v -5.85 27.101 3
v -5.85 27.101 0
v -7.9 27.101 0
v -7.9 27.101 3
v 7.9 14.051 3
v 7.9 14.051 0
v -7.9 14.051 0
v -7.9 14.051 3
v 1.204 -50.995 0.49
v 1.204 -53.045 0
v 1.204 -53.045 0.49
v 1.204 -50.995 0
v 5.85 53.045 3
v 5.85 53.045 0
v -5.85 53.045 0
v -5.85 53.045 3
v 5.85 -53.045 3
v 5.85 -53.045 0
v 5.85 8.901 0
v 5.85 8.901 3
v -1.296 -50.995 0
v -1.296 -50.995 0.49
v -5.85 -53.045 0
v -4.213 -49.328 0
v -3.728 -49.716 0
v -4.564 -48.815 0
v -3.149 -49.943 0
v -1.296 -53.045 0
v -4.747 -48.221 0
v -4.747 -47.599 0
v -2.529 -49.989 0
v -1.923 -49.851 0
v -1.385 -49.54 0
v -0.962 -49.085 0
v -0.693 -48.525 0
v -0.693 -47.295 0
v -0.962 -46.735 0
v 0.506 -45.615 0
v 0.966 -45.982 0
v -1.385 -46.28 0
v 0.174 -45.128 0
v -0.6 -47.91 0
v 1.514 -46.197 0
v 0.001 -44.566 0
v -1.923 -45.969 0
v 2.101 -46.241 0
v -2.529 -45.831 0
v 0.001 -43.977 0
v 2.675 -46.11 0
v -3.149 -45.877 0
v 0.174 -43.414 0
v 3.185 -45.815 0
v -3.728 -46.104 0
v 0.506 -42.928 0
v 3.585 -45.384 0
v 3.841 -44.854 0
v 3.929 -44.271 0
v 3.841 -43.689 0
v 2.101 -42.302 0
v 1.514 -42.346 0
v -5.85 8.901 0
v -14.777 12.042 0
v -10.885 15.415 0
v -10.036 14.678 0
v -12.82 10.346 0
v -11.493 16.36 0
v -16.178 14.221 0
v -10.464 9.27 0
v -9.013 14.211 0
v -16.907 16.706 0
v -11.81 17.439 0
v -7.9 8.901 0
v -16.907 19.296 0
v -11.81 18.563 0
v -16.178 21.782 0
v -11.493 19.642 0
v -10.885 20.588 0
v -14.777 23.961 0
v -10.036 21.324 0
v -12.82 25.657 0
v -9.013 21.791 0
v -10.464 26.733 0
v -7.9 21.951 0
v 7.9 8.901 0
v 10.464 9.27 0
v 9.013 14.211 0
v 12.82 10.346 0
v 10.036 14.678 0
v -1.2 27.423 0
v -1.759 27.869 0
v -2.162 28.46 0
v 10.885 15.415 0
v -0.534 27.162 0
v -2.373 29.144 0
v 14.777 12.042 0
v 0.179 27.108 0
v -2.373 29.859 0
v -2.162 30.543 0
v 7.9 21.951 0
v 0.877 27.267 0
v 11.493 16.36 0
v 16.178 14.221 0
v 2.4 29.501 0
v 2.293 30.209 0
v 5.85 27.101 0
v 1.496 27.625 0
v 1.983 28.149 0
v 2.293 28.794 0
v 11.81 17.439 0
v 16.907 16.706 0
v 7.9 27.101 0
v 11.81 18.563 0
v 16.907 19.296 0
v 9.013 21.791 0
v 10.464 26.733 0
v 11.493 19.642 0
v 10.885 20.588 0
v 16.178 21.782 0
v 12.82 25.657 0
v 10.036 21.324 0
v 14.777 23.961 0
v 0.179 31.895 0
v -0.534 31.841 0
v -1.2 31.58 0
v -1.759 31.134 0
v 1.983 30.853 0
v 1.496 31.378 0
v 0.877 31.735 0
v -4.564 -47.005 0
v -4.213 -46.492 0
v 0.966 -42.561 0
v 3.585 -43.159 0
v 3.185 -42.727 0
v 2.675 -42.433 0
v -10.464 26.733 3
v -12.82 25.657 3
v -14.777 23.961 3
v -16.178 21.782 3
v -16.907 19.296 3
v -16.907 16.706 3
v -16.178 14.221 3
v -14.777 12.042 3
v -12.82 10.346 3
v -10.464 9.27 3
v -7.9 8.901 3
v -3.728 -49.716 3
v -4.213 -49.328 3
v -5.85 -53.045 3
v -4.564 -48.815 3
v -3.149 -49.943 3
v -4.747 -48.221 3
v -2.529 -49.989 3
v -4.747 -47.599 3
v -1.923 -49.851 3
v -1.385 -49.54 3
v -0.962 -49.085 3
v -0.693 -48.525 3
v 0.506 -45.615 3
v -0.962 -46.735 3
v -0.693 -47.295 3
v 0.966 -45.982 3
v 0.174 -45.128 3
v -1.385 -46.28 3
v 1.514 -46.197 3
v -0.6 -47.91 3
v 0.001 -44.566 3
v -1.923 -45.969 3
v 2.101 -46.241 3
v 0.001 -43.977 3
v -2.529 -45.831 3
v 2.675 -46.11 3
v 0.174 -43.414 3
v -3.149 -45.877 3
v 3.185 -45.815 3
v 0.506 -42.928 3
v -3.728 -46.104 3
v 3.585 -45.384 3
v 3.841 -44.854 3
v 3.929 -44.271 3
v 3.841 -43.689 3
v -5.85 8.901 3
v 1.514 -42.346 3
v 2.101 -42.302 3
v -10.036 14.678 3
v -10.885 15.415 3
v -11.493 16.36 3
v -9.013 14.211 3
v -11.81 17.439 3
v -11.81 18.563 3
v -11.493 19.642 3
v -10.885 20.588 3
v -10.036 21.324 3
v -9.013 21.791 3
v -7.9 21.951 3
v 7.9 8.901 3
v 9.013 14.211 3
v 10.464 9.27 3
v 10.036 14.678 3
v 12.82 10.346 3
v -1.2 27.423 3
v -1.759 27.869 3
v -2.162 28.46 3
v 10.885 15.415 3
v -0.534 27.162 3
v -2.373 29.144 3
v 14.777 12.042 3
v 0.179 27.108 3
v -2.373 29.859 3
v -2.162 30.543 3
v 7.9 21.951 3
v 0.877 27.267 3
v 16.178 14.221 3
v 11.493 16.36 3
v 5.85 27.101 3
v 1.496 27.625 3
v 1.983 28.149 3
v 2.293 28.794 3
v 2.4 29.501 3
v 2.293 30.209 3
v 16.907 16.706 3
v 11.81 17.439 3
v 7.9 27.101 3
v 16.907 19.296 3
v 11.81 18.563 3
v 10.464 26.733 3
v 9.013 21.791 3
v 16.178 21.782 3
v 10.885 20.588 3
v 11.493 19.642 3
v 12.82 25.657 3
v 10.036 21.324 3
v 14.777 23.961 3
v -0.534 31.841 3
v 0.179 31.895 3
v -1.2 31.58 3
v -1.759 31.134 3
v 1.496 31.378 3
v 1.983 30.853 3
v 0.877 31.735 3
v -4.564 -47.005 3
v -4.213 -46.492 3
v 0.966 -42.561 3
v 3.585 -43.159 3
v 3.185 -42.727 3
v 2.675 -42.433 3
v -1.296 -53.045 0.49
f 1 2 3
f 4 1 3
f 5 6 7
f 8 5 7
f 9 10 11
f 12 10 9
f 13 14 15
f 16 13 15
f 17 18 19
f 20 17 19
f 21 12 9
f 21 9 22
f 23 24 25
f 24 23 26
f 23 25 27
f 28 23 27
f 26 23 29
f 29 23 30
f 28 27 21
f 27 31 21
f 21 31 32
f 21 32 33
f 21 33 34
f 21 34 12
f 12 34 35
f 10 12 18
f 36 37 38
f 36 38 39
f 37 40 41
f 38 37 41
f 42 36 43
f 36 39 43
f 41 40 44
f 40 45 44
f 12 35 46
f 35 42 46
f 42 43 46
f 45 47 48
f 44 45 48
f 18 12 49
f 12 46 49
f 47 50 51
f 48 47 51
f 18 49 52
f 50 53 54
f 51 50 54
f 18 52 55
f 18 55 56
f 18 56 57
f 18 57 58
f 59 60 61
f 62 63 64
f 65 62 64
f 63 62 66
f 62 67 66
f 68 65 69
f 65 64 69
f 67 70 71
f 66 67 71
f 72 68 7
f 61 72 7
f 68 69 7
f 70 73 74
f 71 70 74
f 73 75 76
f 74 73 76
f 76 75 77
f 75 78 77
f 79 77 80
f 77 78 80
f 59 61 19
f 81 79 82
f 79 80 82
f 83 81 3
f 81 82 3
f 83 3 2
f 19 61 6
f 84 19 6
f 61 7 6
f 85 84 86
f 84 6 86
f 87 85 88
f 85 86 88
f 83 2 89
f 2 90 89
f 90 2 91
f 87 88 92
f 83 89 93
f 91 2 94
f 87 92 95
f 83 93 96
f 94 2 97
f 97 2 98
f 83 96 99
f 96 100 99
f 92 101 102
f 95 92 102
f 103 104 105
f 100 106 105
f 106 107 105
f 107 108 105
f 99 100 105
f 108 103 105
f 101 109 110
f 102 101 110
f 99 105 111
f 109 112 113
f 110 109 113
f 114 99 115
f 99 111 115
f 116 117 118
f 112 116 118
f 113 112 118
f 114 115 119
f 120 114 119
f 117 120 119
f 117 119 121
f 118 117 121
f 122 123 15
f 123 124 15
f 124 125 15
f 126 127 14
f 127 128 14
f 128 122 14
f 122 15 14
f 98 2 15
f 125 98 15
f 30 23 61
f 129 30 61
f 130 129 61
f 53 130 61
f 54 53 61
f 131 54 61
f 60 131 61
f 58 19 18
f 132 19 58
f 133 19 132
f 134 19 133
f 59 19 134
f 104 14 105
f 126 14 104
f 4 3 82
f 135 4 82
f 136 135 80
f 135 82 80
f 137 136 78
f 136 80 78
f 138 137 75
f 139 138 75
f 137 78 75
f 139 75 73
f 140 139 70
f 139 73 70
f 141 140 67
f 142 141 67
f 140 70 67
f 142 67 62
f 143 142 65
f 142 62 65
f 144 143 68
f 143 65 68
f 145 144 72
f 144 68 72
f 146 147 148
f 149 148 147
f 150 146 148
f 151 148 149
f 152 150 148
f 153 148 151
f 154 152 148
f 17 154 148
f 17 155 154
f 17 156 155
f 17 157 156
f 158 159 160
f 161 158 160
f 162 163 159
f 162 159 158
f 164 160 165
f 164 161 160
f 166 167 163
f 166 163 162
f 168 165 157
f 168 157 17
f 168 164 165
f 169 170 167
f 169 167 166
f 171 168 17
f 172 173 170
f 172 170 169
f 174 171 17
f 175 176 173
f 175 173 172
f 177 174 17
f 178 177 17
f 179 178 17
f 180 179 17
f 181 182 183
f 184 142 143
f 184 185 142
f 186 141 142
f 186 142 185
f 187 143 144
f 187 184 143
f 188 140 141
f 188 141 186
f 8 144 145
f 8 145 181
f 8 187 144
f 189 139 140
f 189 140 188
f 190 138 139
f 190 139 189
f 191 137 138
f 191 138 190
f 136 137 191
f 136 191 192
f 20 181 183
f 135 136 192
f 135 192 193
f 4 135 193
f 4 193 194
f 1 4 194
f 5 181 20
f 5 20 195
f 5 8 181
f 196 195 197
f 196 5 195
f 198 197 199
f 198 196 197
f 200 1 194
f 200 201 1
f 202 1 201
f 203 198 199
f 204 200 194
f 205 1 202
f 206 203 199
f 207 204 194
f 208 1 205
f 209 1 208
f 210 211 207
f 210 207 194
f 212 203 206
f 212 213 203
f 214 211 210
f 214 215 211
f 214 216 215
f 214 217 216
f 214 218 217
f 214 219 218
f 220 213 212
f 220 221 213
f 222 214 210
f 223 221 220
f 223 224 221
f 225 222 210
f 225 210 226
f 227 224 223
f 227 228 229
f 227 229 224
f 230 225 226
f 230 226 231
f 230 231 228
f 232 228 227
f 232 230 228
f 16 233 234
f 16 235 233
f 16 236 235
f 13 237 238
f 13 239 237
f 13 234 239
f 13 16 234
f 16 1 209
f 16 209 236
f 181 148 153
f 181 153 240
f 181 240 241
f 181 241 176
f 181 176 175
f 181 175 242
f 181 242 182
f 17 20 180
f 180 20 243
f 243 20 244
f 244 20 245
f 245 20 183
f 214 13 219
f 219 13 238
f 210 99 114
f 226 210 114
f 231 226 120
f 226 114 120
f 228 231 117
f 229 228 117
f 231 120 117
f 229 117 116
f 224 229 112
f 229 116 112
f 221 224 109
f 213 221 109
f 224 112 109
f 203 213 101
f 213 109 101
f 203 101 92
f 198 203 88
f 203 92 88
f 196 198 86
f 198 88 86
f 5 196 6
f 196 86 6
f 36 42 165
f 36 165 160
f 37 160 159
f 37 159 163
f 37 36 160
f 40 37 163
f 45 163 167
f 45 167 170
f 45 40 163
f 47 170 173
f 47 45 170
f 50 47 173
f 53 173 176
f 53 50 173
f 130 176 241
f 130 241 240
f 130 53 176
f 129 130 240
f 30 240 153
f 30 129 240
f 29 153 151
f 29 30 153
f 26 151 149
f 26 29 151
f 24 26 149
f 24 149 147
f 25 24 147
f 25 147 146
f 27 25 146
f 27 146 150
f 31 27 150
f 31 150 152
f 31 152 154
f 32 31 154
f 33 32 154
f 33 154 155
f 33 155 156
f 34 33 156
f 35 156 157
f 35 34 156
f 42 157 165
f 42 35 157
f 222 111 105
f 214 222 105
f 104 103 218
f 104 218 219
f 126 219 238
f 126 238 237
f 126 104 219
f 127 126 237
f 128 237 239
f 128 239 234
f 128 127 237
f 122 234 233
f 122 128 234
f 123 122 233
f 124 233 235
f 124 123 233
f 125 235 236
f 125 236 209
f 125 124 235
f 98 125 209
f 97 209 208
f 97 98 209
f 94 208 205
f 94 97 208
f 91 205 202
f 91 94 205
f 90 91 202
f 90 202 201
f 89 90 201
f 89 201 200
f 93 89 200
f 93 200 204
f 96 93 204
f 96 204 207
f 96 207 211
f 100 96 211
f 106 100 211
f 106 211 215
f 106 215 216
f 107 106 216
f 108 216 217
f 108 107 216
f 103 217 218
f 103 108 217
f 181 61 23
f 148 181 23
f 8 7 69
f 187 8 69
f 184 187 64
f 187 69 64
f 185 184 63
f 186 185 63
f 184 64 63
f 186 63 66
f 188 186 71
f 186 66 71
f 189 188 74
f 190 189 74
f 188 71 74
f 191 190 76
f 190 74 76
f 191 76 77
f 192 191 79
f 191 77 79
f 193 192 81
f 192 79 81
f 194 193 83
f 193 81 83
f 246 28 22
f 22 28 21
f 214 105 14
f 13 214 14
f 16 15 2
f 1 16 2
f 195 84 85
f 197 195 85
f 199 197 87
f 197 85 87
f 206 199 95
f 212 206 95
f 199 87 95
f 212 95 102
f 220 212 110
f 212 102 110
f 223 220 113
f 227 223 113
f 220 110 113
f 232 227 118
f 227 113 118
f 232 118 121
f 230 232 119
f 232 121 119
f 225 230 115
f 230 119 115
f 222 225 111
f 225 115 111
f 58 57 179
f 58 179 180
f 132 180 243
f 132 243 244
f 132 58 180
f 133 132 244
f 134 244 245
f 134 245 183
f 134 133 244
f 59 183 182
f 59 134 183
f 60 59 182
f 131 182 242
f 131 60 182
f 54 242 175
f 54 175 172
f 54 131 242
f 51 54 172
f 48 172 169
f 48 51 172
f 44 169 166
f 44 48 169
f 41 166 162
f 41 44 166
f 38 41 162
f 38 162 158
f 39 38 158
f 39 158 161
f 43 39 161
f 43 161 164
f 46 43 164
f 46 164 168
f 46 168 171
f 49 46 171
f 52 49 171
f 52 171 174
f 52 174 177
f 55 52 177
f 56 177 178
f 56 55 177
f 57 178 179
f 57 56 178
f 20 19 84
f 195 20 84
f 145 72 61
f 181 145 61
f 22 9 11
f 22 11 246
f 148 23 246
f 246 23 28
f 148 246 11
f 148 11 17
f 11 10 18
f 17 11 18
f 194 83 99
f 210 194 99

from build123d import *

# Parameters (mm, degrees)
SKETCH1_R           = 2.085
SKETCH1_R_2         = 1.975
SKETCH1_R_3         = 2.4
BOSS_EXTRUDE1_DEPTH = 3
SKETCH2_W           = 2.5
SKETCH2_H           = 2.05
CUT_EXTRUDE1_DEPTH  = 0.49


with BuildPart() as part:
    # Sketch1 → Boss-Extrude1 (new body)
    with BuildSketch(Plane.XY):
        with BuildLine():
            Line((-5.85, 53.045), (-5.85, 27.101350435))
            Line((-5.85, 27.101350435), (-7.9, 27.101350435))
            ThreePointArc((-7.9, 27.101350435), (-17, 18.001350435), (-7.9, 8.901350435))
            Line((-7.9, 8.901350435), (-5.85, 8.901350435))
            Line((-5.85, 8.901350435), (-5.85, -53.045))
            Line((-5.85, -53.045), (-2.685, -53.045))
            Line((-2.685, -53.045), (5.85, -53.045))
            Line((5.85, -53.045), (5.85, 8.901350435))
            Line((5.85, 8.901350435), (7.9, 8.901350435))
            ThreePointArc((7.9, 8.901350435), (17, 18.001350435), (7.9, 27.101350435))
            Line((7.9, 27.101350435), (5.85, 27.101350435))
            Line((5.85, 27.101350435), (5.85, 53.045))
            Line((5.85, 53.045), (-5.85, 53.045))
        make_face()
        with Locations((-2.685, -47.91)):
            Circle(SKETCH1_R, mode=Mode.SUBTRACT)
        with Locations((1.953620485, -44.271379515)):
            Circle(SKETCH1_R_2, mode=Mode.SUBTRACT)
        with BuildLine():
            Line((-7.9, 21.951350435), (7.9, 21.951350435))
            ThreePointArc((7.9, 21.951350435), (11.85, 18.001350435), (7.9, 14.051350435))
            Line((7.9, 14.051350435), (-7.9, 14.051350435))
            ThreePointArc((-7.9, 14.051350435), (-11.85, 18.001350435), (-7.9, 21.951350435))
        make_face(mode=Mode.SUBTRACT)
        with Locations((0, 29.501350435)):
            Circle(SKETCH1_R_3, mode=Mode.SUBTRACT)
    extrude(amount=BOSS_EXTRUDE1_DEPTH)

    # Sketch2 → Cut-Extrude1 (cut)
    with BuildSketch(Plane(origin=(0, 0, 0), x_dir=(-1, 0, 0), z_dir=(0, 0, -1))):
        with Locations((0.045545975, -52.02)):
            Rectangle(SKETCH2_W, SKETCH2_H)
    extrude(amount=-CUT_EXTRUDE1_DEPTH, mode=Mode.SUBTRACT)


solid = part.part
